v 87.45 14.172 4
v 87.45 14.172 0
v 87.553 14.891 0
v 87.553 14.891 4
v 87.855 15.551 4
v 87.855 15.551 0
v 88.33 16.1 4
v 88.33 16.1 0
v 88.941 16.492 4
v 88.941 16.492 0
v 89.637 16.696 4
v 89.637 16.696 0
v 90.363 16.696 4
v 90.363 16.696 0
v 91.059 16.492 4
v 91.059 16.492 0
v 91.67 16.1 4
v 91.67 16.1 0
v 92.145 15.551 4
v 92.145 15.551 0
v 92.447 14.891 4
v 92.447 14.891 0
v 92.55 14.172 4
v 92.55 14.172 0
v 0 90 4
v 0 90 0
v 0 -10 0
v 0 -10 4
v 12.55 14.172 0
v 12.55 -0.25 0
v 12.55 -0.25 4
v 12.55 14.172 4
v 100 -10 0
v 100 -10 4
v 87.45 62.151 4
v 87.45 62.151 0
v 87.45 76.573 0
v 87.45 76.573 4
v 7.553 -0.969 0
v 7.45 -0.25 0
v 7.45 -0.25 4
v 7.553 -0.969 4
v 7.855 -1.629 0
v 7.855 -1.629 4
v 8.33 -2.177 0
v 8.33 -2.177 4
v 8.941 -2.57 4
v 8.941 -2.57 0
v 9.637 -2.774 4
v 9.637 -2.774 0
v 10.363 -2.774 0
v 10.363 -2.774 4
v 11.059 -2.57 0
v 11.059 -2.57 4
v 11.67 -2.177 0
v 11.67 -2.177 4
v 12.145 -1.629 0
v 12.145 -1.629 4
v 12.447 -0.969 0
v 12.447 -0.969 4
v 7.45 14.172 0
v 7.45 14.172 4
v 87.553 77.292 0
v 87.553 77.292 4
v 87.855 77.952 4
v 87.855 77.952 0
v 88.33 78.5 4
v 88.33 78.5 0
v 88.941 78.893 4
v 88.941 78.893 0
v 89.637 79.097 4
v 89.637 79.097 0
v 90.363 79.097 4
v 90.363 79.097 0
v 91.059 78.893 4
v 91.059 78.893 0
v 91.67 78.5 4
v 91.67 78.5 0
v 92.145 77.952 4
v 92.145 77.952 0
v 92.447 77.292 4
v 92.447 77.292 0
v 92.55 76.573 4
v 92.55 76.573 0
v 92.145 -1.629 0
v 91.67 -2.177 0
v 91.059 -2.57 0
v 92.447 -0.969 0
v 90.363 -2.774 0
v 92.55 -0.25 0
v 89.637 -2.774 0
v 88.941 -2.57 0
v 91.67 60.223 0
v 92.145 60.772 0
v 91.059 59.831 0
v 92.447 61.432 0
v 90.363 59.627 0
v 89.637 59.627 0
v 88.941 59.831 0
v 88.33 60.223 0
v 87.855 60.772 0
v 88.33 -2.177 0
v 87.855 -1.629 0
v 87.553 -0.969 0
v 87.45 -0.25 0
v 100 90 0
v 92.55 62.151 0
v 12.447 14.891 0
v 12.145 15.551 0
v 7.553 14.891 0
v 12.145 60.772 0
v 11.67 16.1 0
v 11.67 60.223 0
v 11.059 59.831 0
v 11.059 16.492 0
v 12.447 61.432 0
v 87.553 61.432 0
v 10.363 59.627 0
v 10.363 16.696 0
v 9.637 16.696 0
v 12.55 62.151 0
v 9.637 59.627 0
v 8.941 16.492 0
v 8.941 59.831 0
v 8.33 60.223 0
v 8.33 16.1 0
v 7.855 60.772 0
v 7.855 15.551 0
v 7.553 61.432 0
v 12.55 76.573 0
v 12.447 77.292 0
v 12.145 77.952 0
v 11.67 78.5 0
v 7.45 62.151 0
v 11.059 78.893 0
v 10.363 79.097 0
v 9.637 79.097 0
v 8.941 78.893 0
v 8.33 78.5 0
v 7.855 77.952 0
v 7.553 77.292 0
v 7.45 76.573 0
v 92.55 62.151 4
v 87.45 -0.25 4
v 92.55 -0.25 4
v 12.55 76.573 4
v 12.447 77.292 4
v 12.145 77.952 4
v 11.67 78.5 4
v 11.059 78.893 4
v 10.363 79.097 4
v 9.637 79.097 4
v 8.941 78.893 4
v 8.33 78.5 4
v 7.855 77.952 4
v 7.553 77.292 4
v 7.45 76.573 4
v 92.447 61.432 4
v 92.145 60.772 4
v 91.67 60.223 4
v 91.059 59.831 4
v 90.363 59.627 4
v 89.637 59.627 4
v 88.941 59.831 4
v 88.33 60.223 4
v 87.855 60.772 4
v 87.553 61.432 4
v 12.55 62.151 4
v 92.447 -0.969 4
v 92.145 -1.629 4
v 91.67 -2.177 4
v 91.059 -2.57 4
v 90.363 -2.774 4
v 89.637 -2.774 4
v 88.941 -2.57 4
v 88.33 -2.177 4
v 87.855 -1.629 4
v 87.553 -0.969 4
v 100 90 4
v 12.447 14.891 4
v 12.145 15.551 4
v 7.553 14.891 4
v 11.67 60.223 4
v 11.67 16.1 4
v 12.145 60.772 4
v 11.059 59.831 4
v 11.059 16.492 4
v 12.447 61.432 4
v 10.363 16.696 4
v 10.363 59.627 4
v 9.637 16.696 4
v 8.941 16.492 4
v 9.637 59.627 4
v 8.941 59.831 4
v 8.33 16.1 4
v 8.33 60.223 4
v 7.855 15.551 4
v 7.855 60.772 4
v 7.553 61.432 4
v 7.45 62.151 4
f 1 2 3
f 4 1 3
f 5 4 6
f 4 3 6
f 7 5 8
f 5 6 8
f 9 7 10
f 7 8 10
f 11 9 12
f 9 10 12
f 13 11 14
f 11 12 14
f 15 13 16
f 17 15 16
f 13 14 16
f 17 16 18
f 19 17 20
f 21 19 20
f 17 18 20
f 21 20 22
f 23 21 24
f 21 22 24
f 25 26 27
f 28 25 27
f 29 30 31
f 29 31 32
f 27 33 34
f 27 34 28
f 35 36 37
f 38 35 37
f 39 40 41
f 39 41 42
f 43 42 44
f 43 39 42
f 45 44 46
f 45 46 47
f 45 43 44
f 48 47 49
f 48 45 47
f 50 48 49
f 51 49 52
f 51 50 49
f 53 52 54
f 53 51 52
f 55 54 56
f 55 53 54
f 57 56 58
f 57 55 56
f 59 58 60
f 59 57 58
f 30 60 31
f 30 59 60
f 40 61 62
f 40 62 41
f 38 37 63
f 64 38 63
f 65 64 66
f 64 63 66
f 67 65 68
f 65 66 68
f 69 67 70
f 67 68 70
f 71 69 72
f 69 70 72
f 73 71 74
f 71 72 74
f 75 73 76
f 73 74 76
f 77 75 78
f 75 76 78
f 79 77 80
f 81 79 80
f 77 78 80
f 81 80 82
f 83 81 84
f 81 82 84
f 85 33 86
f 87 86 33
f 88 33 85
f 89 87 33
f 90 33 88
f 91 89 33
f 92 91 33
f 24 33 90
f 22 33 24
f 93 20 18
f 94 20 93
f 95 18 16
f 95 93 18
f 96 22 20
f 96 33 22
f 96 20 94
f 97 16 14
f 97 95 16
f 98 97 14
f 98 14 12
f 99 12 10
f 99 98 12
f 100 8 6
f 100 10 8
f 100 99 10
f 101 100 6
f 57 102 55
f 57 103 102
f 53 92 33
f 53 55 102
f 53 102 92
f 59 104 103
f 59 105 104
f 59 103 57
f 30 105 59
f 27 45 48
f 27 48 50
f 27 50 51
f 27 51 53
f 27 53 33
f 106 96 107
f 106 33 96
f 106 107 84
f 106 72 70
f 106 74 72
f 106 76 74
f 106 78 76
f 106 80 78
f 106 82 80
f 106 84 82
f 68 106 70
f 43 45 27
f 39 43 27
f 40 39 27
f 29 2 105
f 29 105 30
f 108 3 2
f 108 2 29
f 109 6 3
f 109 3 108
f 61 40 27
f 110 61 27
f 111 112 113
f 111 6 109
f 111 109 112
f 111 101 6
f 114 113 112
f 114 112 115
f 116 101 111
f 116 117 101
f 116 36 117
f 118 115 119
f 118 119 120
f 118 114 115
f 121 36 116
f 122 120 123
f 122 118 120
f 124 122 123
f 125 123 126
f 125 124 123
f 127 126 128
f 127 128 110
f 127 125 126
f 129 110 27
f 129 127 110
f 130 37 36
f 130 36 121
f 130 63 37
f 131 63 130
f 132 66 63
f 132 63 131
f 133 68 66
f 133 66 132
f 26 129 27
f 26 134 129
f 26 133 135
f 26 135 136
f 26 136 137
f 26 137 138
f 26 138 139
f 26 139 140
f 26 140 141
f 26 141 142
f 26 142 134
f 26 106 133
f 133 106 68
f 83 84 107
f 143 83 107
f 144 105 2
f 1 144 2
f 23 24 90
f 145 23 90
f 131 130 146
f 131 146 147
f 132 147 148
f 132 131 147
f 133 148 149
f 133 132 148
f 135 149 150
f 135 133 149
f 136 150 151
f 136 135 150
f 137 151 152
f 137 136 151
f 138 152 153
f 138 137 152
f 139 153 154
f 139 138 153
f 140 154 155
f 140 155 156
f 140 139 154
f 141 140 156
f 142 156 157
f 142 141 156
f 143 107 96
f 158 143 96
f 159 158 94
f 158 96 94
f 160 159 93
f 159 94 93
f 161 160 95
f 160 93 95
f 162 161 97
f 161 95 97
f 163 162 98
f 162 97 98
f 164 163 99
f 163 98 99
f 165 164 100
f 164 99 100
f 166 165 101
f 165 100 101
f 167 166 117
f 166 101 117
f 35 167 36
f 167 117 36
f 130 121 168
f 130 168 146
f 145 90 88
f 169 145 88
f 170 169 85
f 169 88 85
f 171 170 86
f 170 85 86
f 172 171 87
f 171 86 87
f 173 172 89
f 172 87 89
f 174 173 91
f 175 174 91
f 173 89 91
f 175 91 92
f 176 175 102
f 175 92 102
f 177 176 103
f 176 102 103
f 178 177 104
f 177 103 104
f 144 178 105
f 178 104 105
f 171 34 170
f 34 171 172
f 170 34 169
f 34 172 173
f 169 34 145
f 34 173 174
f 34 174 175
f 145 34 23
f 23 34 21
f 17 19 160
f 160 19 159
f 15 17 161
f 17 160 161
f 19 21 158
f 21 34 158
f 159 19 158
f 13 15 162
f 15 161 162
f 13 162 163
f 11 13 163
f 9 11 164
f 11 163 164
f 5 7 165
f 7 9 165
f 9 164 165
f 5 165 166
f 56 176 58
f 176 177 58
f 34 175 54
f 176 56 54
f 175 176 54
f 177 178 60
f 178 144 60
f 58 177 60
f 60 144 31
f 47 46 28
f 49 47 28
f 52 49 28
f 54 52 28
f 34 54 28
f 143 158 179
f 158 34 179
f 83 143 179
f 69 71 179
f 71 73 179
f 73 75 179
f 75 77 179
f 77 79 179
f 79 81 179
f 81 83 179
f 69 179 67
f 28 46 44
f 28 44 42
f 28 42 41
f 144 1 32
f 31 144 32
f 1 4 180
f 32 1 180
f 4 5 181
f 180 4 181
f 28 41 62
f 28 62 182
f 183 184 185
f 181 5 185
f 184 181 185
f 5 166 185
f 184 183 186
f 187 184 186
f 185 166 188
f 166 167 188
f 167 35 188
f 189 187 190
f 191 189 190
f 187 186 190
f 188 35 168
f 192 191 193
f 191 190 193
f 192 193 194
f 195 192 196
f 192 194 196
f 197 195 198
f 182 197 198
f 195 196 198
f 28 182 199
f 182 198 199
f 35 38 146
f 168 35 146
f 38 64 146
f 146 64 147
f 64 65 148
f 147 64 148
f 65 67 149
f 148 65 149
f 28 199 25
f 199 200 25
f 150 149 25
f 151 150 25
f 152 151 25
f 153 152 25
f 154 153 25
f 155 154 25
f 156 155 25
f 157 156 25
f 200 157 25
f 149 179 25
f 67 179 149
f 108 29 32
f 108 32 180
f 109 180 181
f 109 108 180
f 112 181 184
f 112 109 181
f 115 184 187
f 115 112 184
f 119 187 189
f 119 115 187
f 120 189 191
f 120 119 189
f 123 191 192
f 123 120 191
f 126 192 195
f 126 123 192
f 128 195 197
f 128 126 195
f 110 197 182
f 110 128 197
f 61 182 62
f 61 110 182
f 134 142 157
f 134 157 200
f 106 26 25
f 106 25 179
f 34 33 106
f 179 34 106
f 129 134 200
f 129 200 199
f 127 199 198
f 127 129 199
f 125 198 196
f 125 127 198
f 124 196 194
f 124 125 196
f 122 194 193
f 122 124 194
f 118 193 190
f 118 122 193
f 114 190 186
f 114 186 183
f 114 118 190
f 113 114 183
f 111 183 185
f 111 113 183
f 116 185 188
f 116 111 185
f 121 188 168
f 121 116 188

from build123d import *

# Parameters (mm, degrees)
BOSS_EXTRUDE1_DEPTH = 4


with BuildPart() as part:
    # Sketch1 → Boss-Extrude1 (new body)
    with BuildSketch(Plane.XY):
        Polygon((0, 0), (0, 90), (100, 90), (100, 2.372295937), (100, -10), (0, -10), align=None)
        with BuildLine():
            Line((7.45, 14.17243776), (7.45, -0.25030049))
            ThreePointArc((7.45, -0.25030049), (10, -2.80030049), (12.55, -0.25030049))
            Line((12.55, -0.25030049), (12.55, 14.17243776))
            ThreePointArc((12.55, 14.17243776), (10, 16.72243776), (7.45, 14.17243776))
        make_face(mode=Mode.SUBTRACT)
        with BuildLine():
            Line((87.45, 62.150571419), (87.45, 76.57330967))
            ThreePointArc((87.45, 76.57330967), (90, 79.12330967), (92.55, 76.57330967))
            Line((92.55, 76.57330967), (92.55, 62.150571419))
            ThreePointArc((92.55, 62.150571419), (90, 59.600571419), (87.45, 62.150571419))
        make_face(mode=Mode.SUBTRACT)
        with BuildLine():
            Line((92.55, 14.17243776), (92.55, -0.25030049))
            ThreePointArc((92.55, -0.25030049), (90, -2.80030049), (87.45, -0.25030049))
            Line((87.45, -0.25030049), (87.45, 14.17243776))
            ThreePointArc((87.45, 14.17243776), (90, 16.72243776), (92.55, 14.17243776))
        make_face(mode=Mode.SUBTRACT)
        with BuildLine():
            Line((12.55, 62.150571419), (12.55, 76.57330967))
            ThreePointArc((12.55, 76.57330967), (10, 79.12330967), (7.45, 76.57330967))
            Line((7.45, 76.57330967), (7.45, 62.150571419))
            ThreePointArc((7.45, 62.150571419), (10, 59.600571419), (12.55, 62.150571419))
        make_face(mode=Mode.SUBTRACT)
    extrude(amount=BOSS_EXTRUDE1_DEPTH)


solid = part.part
